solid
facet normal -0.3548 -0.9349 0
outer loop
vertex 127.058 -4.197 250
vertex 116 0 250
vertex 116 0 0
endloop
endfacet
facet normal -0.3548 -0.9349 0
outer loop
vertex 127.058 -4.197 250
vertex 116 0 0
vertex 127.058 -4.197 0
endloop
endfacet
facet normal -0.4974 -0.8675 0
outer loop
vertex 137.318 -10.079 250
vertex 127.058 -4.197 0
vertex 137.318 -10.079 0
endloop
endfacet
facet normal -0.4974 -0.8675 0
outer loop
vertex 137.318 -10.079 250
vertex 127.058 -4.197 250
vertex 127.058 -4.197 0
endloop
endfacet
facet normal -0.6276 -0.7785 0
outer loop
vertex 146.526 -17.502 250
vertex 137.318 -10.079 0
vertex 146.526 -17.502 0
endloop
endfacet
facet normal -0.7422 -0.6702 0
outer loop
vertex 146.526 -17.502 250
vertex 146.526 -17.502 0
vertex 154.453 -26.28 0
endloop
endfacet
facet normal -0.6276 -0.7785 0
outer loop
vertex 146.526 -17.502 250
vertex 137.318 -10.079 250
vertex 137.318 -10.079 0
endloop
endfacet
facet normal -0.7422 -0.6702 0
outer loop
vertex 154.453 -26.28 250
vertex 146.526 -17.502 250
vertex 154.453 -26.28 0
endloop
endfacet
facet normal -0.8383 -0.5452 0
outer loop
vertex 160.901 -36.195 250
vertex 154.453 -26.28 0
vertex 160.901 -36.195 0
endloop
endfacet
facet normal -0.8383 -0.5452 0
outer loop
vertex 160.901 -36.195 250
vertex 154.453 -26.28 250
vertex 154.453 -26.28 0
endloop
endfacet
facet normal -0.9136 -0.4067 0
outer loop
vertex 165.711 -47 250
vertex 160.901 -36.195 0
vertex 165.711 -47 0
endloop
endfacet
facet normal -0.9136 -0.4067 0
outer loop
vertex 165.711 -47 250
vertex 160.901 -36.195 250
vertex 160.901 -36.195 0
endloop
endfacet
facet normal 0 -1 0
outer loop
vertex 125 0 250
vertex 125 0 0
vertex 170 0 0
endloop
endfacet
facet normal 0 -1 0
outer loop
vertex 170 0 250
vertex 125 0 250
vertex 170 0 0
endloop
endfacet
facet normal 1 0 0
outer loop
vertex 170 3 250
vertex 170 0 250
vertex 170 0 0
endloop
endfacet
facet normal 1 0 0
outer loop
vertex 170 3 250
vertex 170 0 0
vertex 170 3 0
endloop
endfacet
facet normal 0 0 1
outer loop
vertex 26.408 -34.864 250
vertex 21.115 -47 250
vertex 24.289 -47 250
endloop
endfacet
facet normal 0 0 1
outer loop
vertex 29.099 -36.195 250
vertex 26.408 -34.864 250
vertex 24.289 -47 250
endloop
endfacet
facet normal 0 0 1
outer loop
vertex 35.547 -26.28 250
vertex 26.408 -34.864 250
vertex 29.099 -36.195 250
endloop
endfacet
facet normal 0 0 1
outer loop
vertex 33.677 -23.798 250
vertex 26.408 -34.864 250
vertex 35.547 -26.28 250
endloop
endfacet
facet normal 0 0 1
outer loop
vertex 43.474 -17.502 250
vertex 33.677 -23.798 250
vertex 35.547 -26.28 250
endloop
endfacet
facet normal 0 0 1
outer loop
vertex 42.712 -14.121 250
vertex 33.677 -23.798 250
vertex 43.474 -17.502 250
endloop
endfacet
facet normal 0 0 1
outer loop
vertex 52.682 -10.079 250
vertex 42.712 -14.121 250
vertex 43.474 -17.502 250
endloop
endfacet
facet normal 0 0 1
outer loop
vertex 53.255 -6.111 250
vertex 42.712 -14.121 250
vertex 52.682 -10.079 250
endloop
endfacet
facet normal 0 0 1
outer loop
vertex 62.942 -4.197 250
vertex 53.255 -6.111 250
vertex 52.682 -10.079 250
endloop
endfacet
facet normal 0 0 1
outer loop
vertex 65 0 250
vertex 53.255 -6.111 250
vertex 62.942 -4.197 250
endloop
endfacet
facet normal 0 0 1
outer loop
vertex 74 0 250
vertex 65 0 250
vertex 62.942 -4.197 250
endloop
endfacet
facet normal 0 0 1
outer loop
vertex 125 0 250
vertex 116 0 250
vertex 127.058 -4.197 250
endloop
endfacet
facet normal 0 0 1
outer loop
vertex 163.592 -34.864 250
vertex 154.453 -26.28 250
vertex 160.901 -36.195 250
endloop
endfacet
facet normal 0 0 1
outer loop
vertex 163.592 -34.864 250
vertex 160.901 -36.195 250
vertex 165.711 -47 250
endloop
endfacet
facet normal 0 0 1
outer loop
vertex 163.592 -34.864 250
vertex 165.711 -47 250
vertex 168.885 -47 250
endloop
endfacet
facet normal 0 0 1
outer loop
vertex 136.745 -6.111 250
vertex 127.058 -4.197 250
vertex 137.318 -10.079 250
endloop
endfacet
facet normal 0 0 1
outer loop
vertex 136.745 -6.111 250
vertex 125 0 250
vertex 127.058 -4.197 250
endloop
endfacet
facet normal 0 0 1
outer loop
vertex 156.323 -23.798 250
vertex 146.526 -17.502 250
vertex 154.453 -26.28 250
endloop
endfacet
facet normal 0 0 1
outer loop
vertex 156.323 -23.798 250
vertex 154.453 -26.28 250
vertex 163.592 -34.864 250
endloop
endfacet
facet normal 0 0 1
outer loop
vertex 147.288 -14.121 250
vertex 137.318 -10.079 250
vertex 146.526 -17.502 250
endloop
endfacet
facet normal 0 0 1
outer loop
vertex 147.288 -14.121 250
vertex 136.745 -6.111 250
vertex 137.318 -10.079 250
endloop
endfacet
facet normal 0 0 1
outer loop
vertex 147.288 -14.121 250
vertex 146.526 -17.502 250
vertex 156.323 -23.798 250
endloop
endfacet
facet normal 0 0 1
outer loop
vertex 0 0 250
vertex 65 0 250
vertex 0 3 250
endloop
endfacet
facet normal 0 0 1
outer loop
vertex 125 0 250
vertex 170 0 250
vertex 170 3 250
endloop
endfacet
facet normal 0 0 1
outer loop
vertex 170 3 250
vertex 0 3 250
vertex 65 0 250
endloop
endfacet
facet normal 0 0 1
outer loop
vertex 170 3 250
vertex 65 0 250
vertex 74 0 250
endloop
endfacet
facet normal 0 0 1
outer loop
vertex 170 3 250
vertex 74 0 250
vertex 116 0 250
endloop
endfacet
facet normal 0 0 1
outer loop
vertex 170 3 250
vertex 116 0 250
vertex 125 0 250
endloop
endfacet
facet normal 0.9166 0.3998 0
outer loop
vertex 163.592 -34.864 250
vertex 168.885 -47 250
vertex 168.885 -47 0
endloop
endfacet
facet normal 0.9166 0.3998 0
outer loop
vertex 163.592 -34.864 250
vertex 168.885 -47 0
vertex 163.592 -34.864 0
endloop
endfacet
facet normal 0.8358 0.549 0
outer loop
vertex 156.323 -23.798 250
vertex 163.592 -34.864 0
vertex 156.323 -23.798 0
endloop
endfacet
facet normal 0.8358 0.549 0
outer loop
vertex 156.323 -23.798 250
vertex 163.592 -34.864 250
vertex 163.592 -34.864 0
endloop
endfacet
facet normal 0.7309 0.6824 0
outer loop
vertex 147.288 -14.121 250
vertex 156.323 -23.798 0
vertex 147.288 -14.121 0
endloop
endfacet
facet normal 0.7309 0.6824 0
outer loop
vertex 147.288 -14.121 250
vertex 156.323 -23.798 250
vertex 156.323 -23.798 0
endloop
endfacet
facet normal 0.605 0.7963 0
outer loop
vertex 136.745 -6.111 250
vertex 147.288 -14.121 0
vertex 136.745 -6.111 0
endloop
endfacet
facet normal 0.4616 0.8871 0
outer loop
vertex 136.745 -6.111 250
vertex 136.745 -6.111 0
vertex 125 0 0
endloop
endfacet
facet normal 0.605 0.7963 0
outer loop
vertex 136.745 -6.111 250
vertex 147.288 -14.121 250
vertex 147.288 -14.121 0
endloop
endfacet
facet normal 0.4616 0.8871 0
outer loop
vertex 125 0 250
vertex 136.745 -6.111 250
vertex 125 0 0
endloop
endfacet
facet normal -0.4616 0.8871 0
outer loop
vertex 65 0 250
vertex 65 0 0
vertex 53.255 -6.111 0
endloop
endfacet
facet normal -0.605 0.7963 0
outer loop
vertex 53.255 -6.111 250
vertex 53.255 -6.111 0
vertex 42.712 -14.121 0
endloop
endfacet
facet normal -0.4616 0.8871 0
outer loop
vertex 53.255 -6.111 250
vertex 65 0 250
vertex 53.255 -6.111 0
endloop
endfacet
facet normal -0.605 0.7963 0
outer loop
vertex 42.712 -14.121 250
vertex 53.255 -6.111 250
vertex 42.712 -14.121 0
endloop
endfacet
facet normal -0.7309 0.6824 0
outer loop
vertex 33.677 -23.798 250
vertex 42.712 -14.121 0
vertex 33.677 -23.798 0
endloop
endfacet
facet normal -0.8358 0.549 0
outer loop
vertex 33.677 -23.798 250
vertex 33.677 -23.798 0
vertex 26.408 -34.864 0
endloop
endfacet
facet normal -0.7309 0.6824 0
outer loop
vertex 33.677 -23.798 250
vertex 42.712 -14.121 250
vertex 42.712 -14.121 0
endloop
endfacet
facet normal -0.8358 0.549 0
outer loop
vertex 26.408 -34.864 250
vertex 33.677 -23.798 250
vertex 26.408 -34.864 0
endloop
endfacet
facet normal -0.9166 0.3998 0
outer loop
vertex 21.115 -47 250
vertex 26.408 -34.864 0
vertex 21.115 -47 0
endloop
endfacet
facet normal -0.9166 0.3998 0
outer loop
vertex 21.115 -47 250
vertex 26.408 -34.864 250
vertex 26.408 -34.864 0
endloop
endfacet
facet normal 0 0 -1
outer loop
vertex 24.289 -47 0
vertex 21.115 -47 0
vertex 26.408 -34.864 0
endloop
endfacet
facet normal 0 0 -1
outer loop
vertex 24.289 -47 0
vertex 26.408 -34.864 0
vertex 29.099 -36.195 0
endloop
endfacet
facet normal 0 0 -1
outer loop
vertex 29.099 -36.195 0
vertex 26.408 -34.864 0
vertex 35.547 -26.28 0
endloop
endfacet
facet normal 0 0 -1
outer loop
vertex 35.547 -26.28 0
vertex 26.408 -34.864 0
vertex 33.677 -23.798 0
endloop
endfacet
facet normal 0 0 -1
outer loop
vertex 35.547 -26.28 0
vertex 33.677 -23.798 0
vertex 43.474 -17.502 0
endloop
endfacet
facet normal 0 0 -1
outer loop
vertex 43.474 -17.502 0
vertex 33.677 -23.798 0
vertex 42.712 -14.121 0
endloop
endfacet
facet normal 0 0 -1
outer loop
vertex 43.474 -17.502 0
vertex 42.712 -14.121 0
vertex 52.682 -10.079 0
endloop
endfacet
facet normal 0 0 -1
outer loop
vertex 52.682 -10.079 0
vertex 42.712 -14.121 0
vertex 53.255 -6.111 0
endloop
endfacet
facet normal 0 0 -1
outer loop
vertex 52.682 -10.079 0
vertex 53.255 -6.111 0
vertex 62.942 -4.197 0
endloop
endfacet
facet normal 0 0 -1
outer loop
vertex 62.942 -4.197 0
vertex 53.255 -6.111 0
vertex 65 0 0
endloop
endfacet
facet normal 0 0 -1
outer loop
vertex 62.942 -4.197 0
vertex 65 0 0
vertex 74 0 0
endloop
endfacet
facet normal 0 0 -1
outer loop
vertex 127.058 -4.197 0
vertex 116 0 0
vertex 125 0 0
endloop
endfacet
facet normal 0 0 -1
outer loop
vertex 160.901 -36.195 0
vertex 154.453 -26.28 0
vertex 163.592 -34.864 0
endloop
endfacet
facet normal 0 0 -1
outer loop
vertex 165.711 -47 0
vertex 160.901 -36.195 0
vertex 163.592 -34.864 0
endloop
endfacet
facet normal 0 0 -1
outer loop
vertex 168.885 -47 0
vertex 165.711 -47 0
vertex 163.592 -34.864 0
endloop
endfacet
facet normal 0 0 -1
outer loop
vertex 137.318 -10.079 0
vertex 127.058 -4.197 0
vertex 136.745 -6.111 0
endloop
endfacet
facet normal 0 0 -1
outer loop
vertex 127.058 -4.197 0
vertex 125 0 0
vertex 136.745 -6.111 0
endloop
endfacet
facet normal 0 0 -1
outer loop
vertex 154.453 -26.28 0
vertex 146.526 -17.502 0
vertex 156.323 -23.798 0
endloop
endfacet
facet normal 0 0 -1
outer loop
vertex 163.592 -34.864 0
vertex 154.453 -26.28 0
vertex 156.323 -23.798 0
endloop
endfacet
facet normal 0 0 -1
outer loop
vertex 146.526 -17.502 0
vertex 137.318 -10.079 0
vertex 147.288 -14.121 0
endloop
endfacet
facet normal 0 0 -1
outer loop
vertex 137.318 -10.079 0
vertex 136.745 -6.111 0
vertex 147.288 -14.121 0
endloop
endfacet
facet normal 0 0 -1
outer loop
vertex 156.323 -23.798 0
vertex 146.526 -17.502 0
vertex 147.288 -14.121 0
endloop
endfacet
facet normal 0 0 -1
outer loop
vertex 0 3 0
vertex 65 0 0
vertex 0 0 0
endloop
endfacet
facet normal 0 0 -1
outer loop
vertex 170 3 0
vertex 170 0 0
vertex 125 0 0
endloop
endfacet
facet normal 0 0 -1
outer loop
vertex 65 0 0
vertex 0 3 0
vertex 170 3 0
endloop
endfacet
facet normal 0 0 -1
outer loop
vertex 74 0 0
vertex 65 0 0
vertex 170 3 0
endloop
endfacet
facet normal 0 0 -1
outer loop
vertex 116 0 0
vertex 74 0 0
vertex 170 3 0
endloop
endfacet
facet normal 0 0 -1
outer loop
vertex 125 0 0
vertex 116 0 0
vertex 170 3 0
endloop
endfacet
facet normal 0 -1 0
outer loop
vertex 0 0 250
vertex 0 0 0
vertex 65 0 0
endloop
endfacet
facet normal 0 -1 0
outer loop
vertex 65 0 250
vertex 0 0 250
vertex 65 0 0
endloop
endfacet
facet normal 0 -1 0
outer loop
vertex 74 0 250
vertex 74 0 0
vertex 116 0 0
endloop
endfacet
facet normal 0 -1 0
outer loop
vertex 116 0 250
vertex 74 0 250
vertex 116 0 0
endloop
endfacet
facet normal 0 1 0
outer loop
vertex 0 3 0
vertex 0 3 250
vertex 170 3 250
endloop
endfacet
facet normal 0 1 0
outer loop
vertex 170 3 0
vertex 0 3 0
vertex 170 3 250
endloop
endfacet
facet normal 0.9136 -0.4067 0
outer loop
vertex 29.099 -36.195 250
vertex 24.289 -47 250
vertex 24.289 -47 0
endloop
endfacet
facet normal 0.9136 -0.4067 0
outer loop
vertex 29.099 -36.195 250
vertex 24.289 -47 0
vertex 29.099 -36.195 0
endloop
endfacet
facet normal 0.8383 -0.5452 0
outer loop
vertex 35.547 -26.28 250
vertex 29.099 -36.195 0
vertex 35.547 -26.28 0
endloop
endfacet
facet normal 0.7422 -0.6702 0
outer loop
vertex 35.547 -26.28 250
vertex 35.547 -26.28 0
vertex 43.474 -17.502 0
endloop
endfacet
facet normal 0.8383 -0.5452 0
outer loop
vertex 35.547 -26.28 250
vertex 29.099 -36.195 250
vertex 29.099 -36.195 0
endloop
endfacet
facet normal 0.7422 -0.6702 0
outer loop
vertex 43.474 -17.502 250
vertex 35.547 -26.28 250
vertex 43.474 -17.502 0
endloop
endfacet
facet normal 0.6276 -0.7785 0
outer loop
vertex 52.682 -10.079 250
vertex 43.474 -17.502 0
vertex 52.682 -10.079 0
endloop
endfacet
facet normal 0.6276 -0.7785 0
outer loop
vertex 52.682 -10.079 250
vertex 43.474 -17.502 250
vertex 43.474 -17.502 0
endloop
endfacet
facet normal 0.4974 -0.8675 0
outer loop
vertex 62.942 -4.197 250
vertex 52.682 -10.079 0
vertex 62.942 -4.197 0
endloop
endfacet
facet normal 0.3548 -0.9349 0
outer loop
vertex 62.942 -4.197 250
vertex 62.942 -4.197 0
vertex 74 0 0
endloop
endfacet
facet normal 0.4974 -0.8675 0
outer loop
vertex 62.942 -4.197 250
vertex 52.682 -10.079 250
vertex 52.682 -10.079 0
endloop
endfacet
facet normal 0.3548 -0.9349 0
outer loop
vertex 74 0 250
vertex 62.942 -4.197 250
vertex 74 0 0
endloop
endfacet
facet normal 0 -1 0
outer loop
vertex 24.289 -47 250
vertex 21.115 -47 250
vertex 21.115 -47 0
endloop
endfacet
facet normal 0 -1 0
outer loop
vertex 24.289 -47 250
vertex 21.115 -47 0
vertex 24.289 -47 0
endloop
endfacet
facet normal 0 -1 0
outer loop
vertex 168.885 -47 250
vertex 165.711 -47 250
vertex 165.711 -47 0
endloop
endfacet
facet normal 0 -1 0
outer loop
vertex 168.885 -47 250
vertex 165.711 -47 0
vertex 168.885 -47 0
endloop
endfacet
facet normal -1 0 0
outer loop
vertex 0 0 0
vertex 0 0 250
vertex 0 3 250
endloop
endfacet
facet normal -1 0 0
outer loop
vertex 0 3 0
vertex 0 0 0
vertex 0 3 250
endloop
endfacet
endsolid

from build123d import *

# Parameters (mm, degrees)
ESQUISSE1_W        = 170
ESQUISSE1_H        = 3
BOSS_EXTRU_1_DEPTH = 250
BOSS_EXTRU_2_DEPTH = 250


with BuildPart() as part:
    # Esquisse1 → Boss.-Extru.1 (new body)
    with BuildSketch(Plane.XY):
        with Locations((85, 1.5)):
            Rectangle(ESQUISSE1_W, ESQUISSE1_H)
    extrude(amount=BOSS_EXTRU_1_DEPTH)

    # Esquisse3 → Boss.-Extru.2 (add)
    with BuildSketch(Plane.XY.offset(250)):
        with BuildLine():
            Line((21.114954152, -47), (24.289321881, -47))
            ThreePointArc((24.289321881, -47), (43.473675463, -17.501946092), (74, 0))
            Line((74, 0), (65, 0))
            ThreePointArc((65, 0), (37.988810855, -18.767262777), (21.114954152, -47))
        make_face()
        with BuildLine():
            Line((165.710678119, -47), (168.885045848, -47))
            ThreePointArc((168.885045848, -47), (152.011189145, -18.767262777), (125, 0))
            Line((125, 0), (116, 0))
            ThreePointArc((116, 0), (146.526324537, -17.501946092), (165.710678119, -47))
        make_face()
    extrude(amount=-BOSS_EXTRU_2_DEPTH)


solid = part.part
